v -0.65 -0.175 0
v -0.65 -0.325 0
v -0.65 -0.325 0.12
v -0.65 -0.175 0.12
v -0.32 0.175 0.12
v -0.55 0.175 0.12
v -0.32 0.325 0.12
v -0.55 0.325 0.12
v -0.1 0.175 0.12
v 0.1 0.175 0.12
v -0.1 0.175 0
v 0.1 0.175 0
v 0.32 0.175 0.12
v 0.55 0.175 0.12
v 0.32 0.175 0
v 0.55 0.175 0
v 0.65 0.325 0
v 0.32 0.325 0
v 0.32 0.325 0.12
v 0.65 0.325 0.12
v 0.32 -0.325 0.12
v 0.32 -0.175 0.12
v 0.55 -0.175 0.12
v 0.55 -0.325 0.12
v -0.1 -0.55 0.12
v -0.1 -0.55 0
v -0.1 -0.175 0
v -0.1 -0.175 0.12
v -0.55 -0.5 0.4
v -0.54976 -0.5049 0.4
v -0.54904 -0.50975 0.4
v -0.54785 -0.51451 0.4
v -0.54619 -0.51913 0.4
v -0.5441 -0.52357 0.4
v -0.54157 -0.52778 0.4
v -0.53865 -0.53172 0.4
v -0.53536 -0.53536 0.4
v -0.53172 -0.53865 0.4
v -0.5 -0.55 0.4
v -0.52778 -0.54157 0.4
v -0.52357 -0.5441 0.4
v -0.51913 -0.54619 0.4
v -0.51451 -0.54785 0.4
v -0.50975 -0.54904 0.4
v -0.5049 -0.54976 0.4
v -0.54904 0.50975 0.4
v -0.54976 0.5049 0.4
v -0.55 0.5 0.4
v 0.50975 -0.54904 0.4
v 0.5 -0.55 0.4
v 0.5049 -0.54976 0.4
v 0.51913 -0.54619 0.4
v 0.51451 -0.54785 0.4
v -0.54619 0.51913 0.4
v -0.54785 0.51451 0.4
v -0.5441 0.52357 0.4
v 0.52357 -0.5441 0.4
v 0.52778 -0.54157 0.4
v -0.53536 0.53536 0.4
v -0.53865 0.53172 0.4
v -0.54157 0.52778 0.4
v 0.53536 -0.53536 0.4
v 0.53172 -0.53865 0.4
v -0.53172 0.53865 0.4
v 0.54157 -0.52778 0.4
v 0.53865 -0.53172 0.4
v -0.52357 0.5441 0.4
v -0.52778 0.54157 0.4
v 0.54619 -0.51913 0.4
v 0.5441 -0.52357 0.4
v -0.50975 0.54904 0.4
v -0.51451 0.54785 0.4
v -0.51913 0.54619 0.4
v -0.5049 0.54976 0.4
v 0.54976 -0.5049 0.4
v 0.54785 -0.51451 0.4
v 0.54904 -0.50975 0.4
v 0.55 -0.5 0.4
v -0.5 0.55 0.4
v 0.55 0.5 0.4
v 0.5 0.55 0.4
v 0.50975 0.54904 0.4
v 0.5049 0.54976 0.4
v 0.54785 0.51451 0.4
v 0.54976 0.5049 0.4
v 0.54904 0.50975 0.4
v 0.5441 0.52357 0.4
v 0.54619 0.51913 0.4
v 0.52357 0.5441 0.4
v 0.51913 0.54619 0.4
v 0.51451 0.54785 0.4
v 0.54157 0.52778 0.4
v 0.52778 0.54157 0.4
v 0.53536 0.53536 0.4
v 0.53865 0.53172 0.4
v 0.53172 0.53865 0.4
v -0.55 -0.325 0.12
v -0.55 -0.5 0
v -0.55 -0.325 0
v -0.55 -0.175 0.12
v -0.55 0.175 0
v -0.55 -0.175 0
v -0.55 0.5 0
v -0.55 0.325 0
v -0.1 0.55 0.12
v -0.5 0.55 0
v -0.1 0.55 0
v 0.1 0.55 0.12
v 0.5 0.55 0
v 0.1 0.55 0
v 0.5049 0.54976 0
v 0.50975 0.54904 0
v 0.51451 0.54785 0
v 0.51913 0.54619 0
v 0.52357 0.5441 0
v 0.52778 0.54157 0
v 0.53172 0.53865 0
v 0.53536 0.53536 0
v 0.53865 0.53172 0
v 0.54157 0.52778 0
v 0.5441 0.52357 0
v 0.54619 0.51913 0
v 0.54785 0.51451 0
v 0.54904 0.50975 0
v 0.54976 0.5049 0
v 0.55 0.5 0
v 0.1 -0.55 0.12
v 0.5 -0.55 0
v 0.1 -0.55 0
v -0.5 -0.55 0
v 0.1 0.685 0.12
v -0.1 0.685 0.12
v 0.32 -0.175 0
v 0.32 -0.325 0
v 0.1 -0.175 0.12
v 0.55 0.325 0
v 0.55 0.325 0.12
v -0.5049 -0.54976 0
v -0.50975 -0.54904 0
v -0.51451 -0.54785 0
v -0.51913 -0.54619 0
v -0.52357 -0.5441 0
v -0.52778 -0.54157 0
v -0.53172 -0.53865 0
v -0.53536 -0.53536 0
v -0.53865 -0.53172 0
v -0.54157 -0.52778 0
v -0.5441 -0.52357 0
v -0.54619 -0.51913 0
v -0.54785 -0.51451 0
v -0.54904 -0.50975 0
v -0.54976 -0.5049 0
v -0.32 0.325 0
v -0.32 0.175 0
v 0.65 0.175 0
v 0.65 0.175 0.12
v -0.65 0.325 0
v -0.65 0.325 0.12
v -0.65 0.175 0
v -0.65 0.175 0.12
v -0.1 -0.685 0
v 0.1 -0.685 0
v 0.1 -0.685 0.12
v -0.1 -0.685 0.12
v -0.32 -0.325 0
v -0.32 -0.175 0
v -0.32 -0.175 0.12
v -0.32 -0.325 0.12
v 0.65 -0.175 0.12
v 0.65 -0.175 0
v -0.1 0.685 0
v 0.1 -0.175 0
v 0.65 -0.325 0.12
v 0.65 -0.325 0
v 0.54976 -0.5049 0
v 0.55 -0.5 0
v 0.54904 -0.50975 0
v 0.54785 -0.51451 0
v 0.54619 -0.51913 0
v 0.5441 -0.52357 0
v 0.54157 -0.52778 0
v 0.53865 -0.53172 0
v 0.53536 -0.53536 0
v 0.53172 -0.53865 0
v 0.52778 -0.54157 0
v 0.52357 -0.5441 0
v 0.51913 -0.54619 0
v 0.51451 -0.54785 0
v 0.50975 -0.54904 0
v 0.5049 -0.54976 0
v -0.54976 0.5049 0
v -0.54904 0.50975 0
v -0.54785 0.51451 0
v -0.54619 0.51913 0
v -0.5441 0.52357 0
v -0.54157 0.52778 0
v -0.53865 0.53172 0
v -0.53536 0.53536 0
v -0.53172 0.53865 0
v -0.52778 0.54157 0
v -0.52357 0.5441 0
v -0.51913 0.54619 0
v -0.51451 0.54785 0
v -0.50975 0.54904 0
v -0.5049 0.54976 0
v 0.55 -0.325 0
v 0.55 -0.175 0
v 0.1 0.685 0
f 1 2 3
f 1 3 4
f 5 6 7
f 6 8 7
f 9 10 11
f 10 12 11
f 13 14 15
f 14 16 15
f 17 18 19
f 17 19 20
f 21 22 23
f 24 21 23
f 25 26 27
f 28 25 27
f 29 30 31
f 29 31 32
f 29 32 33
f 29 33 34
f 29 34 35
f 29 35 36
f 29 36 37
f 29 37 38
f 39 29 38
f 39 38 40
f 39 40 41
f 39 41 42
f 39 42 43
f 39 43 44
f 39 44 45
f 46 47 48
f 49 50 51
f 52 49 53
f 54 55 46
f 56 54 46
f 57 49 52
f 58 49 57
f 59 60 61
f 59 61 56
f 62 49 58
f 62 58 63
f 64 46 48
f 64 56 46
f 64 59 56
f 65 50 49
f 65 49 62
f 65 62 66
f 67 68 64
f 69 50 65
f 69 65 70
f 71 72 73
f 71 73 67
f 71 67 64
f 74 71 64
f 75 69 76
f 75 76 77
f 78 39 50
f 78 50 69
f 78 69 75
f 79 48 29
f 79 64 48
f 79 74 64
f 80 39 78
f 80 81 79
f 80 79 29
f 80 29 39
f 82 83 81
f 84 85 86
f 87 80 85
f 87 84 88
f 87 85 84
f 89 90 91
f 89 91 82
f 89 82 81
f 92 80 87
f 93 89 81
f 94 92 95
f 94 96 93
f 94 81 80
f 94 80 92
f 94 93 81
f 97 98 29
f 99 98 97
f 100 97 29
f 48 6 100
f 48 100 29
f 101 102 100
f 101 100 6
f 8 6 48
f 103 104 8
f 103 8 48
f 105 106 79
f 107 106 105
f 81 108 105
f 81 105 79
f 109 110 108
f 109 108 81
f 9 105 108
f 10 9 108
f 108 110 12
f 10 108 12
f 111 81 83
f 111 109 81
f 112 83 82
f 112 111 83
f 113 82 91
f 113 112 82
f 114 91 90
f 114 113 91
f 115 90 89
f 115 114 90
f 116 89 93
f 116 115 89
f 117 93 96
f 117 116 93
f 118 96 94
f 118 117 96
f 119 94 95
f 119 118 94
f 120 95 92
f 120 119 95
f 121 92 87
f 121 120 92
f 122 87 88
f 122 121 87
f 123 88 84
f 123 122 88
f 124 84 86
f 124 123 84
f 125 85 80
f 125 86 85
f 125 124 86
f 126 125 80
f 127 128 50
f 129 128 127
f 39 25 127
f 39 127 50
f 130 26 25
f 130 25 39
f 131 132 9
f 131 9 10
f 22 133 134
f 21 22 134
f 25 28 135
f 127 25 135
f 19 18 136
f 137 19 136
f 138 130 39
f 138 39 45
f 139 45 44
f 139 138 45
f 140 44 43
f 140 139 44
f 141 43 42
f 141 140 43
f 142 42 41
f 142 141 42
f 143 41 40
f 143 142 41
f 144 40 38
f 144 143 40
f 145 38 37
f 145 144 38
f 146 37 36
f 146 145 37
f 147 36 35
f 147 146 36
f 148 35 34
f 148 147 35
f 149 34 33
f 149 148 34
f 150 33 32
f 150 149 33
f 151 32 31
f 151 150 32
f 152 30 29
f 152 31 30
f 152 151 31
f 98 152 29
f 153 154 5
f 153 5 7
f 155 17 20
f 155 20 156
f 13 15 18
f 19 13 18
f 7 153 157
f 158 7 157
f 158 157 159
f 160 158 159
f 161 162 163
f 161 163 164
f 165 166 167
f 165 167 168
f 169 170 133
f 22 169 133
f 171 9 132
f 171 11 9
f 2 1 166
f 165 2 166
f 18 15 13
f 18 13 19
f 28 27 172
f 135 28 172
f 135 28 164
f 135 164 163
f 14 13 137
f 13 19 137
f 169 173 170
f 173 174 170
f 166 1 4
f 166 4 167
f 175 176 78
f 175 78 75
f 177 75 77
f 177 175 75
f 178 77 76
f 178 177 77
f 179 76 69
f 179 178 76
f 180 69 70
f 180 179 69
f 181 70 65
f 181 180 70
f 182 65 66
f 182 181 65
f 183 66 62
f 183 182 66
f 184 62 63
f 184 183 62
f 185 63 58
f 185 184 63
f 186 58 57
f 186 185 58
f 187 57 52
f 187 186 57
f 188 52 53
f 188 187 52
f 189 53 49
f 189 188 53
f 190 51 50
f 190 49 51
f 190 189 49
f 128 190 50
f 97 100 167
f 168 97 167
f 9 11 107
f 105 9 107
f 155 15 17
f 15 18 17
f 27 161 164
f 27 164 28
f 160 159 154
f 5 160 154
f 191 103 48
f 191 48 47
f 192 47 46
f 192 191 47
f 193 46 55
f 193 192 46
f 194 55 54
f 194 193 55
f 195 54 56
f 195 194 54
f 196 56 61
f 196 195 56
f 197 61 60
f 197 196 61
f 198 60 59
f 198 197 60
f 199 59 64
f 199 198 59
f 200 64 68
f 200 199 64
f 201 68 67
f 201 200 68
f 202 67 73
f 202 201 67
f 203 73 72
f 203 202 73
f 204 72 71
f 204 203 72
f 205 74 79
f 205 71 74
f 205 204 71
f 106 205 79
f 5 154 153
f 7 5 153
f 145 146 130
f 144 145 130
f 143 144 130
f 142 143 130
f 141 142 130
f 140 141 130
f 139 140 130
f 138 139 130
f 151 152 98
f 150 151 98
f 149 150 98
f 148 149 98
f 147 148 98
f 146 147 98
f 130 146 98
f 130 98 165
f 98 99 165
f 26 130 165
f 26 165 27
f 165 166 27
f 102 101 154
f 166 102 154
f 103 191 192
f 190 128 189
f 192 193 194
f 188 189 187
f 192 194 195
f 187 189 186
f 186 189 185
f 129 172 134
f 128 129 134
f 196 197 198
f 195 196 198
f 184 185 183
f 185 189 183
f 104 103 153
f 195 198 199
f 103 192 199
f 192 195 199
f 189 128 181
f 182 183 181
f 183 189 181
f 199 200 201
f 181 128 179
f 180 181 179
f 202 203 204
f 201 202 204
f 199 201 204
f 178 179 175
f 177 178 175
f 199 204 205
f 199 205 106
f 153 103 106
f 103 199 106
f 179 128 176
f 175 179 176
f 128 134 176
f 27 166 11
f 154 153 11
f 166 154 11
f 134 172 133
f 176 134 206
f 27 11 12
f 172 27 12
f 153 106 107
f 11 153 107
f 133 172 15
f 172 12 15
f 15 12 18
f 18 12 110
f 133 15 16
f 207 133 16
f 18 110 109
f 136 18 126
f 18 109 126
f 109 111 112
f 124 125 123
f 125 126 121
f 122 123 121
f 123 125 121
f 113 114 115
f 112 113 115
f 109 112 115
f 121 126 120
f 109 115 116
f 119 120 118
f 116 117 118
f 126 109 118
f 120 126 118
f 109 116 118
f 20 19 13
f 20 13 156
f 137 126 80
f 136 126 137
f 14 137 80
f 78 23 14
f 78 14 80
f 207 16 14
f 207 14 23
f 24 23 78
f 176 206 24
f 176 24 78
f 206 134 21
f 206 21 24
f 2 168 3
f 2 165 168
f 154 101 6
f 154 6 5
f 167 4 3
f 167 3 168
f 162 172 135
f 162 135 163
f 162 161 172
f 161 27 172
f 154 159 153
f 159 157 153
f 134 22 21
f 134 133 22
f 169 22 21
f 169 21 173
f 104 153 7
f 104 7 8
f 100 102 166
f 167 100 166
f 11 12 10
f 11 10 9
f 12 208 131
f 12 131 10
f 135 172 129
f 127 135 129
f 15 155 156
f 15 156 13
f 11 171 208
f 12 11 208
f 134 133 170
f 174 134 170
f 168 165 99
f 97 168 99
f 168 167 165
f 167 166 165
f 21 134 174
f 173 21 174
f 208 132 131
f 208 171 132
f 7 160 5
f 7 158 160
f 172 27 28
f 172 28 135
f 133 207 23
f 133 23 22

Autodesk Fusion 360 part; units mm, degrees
sketch "草图1" plane through (0, 0, 0) normal (0, 0, 1) x (1, 0, 0)
  line L0 (0, 4) -> (0, -5) construction
  line L1 (-7.5, 0) -> (7.5, 0) construction
  line L2 (-0.1, 0.685) -> (0.1, 0.685)
  line L3 (0.1, 0.685) -> (0.1, 0.175)
  line L4 (0.1, 0.175) -> (-0.1, 0.175)
  line L5 (-0.1, 0.175) -> (-0.1, 0.685)
  line L6 (-0.1, -0.175) -> (0.1, -0.175)
  line L7 (0.1, -0.175) -> (0.1, -0.685)
  line L8 (0.1, -0.685) -> (-0.1, -0.685)
  line L9 (-0.1, -0.685) -> (-0.1, -0.175)
  line L10 (-0.32, 0.325) -> (-0.65, 0.325)
  line L11 (-0.65, 0.325) -> (-0.65, 0.175)
  line L12 (-0.65, 0.175) -> (-0.32, 0.175)
  line L13 (-0.32, 0.175) -> (-0.32, 0.325)
  line L14 (-0.65, -0.175) -> (-0.32, -0.175)
  line L15 (-0.32, -0.175) -> (-0.32, -0.325)
  line L16 (-0.32, -0.325) -> (-0.65, -0.325)
  line L17 (-0.65, -0.325) -> (-0.65, -0.175)
  line L18 (0.32, -0.325) -> (0.65, -0.325)
  line L19 (0.65, -0.175) -> (0.32, -0.175)
  line L20 (0.32, -0.175) -> (0.32, -0.325)
  line L21 (0.65, -0.325) -> (0.65, -0.175)
  line L22 (0.65, 0.325) -> (0.65, 0.175)
  line L23 (0.32, 0.325) -> (0.65, 0.325)
  line L24 (0.65, 0.175) -> (0.32, 0.175)
  line L25 (0.32, 0.175) -> (0.32, 0.325)
  line L26 (-0.5, 0.55) -> (0.5, 0.55)
  line L27 (0.55, 0.5) -> (0.55, -0.5)
  line L28 (0.5, -0.55) -> (-0.5, -0.55)
  line L29 (-0.55, -0.5) -> (-0.55, 0.5)
  arc A0 (-0.5, 0.55) -> (-0.55, 0.5) centre (-0.5, 0.5) ccw
  arc A1 (0.55, 0.5) -> (0.5, 0.55) centre (0.5, 0.5) ccw
  arc A2 (0.5, -0.55) -> (0.55, -0.5) centre (0.5, -0.5) ccw
  arc A3 (-0.55, -0.5) -> (-0.5, -0.55) centre (-0.5, -0.5) ccw
  dimension "d1" = 0.15
  dimension "d2" = 0.2
  dimension "d3" = 0.51
  dimension "d6" = 0.33
  dimension "d7" = 0.65
  dimension "d8" = 0.65
  dimension "d10" = 0.51
  dimension "d11" = 0.51
  dimension "d12" = 0.05
  dimension "d13" = 1
  dimension "d14" = 1
extrude "拉伸1" add sketch "草图1" along normal blind 0.4 contours L3 L4 L5 L26 | L3 L4 L5 L6 L7 L9 L10 L12 L13 L14 L15 L16 L18 L19 L20 L23 L24 L25 L26 L27 L28 L29 A0 A1 A2 A3 | L10 L12 L13 L29 | L23 L24 L25 L27 | L14 L15 L16 L29 | L18 L19 L20 L27 | L6 L7 L9 L28 makes body 1
extrude "拉伸2" cut sketch "草图1" along normal blind 0.12 contours L3 L4 L5 L26 | L10 L12 L13 L29 | L23 L24 L25 L27 | L14 L15 L16 L29 | L18 L19 L20 L27 | L6 L7 L9 L28 bodies 1
extrude "拉伸3" add sketch "草图1" along normal blind 0.12 separate body contours L2 L3 L5 L26 | L3 L4 L5 L26 | L10 L11 L12 L29 | L10 L12 L13 L29 | L23 L24 L25 L27 | L22 L23 L24 L27 | L14 L16 L17 L29 | L14 L15 L16 L29 | L18 L19 L20 L27 | L18 L19 L21 L27 | L7 L8 L9 L28 | L6 L7 L9 L28 makes body 2 at (0.0333, 0.345, 0) makes body 3 at (-0.0333, -0.345, 0) makes body 4 at (-0.54, 0.275, 0) makes body 5 at (0.54, 0.225, 0) makes body 6 at (0.43, -0.225, 0) makes body 7 at (-0.54, -0.225, 0)
